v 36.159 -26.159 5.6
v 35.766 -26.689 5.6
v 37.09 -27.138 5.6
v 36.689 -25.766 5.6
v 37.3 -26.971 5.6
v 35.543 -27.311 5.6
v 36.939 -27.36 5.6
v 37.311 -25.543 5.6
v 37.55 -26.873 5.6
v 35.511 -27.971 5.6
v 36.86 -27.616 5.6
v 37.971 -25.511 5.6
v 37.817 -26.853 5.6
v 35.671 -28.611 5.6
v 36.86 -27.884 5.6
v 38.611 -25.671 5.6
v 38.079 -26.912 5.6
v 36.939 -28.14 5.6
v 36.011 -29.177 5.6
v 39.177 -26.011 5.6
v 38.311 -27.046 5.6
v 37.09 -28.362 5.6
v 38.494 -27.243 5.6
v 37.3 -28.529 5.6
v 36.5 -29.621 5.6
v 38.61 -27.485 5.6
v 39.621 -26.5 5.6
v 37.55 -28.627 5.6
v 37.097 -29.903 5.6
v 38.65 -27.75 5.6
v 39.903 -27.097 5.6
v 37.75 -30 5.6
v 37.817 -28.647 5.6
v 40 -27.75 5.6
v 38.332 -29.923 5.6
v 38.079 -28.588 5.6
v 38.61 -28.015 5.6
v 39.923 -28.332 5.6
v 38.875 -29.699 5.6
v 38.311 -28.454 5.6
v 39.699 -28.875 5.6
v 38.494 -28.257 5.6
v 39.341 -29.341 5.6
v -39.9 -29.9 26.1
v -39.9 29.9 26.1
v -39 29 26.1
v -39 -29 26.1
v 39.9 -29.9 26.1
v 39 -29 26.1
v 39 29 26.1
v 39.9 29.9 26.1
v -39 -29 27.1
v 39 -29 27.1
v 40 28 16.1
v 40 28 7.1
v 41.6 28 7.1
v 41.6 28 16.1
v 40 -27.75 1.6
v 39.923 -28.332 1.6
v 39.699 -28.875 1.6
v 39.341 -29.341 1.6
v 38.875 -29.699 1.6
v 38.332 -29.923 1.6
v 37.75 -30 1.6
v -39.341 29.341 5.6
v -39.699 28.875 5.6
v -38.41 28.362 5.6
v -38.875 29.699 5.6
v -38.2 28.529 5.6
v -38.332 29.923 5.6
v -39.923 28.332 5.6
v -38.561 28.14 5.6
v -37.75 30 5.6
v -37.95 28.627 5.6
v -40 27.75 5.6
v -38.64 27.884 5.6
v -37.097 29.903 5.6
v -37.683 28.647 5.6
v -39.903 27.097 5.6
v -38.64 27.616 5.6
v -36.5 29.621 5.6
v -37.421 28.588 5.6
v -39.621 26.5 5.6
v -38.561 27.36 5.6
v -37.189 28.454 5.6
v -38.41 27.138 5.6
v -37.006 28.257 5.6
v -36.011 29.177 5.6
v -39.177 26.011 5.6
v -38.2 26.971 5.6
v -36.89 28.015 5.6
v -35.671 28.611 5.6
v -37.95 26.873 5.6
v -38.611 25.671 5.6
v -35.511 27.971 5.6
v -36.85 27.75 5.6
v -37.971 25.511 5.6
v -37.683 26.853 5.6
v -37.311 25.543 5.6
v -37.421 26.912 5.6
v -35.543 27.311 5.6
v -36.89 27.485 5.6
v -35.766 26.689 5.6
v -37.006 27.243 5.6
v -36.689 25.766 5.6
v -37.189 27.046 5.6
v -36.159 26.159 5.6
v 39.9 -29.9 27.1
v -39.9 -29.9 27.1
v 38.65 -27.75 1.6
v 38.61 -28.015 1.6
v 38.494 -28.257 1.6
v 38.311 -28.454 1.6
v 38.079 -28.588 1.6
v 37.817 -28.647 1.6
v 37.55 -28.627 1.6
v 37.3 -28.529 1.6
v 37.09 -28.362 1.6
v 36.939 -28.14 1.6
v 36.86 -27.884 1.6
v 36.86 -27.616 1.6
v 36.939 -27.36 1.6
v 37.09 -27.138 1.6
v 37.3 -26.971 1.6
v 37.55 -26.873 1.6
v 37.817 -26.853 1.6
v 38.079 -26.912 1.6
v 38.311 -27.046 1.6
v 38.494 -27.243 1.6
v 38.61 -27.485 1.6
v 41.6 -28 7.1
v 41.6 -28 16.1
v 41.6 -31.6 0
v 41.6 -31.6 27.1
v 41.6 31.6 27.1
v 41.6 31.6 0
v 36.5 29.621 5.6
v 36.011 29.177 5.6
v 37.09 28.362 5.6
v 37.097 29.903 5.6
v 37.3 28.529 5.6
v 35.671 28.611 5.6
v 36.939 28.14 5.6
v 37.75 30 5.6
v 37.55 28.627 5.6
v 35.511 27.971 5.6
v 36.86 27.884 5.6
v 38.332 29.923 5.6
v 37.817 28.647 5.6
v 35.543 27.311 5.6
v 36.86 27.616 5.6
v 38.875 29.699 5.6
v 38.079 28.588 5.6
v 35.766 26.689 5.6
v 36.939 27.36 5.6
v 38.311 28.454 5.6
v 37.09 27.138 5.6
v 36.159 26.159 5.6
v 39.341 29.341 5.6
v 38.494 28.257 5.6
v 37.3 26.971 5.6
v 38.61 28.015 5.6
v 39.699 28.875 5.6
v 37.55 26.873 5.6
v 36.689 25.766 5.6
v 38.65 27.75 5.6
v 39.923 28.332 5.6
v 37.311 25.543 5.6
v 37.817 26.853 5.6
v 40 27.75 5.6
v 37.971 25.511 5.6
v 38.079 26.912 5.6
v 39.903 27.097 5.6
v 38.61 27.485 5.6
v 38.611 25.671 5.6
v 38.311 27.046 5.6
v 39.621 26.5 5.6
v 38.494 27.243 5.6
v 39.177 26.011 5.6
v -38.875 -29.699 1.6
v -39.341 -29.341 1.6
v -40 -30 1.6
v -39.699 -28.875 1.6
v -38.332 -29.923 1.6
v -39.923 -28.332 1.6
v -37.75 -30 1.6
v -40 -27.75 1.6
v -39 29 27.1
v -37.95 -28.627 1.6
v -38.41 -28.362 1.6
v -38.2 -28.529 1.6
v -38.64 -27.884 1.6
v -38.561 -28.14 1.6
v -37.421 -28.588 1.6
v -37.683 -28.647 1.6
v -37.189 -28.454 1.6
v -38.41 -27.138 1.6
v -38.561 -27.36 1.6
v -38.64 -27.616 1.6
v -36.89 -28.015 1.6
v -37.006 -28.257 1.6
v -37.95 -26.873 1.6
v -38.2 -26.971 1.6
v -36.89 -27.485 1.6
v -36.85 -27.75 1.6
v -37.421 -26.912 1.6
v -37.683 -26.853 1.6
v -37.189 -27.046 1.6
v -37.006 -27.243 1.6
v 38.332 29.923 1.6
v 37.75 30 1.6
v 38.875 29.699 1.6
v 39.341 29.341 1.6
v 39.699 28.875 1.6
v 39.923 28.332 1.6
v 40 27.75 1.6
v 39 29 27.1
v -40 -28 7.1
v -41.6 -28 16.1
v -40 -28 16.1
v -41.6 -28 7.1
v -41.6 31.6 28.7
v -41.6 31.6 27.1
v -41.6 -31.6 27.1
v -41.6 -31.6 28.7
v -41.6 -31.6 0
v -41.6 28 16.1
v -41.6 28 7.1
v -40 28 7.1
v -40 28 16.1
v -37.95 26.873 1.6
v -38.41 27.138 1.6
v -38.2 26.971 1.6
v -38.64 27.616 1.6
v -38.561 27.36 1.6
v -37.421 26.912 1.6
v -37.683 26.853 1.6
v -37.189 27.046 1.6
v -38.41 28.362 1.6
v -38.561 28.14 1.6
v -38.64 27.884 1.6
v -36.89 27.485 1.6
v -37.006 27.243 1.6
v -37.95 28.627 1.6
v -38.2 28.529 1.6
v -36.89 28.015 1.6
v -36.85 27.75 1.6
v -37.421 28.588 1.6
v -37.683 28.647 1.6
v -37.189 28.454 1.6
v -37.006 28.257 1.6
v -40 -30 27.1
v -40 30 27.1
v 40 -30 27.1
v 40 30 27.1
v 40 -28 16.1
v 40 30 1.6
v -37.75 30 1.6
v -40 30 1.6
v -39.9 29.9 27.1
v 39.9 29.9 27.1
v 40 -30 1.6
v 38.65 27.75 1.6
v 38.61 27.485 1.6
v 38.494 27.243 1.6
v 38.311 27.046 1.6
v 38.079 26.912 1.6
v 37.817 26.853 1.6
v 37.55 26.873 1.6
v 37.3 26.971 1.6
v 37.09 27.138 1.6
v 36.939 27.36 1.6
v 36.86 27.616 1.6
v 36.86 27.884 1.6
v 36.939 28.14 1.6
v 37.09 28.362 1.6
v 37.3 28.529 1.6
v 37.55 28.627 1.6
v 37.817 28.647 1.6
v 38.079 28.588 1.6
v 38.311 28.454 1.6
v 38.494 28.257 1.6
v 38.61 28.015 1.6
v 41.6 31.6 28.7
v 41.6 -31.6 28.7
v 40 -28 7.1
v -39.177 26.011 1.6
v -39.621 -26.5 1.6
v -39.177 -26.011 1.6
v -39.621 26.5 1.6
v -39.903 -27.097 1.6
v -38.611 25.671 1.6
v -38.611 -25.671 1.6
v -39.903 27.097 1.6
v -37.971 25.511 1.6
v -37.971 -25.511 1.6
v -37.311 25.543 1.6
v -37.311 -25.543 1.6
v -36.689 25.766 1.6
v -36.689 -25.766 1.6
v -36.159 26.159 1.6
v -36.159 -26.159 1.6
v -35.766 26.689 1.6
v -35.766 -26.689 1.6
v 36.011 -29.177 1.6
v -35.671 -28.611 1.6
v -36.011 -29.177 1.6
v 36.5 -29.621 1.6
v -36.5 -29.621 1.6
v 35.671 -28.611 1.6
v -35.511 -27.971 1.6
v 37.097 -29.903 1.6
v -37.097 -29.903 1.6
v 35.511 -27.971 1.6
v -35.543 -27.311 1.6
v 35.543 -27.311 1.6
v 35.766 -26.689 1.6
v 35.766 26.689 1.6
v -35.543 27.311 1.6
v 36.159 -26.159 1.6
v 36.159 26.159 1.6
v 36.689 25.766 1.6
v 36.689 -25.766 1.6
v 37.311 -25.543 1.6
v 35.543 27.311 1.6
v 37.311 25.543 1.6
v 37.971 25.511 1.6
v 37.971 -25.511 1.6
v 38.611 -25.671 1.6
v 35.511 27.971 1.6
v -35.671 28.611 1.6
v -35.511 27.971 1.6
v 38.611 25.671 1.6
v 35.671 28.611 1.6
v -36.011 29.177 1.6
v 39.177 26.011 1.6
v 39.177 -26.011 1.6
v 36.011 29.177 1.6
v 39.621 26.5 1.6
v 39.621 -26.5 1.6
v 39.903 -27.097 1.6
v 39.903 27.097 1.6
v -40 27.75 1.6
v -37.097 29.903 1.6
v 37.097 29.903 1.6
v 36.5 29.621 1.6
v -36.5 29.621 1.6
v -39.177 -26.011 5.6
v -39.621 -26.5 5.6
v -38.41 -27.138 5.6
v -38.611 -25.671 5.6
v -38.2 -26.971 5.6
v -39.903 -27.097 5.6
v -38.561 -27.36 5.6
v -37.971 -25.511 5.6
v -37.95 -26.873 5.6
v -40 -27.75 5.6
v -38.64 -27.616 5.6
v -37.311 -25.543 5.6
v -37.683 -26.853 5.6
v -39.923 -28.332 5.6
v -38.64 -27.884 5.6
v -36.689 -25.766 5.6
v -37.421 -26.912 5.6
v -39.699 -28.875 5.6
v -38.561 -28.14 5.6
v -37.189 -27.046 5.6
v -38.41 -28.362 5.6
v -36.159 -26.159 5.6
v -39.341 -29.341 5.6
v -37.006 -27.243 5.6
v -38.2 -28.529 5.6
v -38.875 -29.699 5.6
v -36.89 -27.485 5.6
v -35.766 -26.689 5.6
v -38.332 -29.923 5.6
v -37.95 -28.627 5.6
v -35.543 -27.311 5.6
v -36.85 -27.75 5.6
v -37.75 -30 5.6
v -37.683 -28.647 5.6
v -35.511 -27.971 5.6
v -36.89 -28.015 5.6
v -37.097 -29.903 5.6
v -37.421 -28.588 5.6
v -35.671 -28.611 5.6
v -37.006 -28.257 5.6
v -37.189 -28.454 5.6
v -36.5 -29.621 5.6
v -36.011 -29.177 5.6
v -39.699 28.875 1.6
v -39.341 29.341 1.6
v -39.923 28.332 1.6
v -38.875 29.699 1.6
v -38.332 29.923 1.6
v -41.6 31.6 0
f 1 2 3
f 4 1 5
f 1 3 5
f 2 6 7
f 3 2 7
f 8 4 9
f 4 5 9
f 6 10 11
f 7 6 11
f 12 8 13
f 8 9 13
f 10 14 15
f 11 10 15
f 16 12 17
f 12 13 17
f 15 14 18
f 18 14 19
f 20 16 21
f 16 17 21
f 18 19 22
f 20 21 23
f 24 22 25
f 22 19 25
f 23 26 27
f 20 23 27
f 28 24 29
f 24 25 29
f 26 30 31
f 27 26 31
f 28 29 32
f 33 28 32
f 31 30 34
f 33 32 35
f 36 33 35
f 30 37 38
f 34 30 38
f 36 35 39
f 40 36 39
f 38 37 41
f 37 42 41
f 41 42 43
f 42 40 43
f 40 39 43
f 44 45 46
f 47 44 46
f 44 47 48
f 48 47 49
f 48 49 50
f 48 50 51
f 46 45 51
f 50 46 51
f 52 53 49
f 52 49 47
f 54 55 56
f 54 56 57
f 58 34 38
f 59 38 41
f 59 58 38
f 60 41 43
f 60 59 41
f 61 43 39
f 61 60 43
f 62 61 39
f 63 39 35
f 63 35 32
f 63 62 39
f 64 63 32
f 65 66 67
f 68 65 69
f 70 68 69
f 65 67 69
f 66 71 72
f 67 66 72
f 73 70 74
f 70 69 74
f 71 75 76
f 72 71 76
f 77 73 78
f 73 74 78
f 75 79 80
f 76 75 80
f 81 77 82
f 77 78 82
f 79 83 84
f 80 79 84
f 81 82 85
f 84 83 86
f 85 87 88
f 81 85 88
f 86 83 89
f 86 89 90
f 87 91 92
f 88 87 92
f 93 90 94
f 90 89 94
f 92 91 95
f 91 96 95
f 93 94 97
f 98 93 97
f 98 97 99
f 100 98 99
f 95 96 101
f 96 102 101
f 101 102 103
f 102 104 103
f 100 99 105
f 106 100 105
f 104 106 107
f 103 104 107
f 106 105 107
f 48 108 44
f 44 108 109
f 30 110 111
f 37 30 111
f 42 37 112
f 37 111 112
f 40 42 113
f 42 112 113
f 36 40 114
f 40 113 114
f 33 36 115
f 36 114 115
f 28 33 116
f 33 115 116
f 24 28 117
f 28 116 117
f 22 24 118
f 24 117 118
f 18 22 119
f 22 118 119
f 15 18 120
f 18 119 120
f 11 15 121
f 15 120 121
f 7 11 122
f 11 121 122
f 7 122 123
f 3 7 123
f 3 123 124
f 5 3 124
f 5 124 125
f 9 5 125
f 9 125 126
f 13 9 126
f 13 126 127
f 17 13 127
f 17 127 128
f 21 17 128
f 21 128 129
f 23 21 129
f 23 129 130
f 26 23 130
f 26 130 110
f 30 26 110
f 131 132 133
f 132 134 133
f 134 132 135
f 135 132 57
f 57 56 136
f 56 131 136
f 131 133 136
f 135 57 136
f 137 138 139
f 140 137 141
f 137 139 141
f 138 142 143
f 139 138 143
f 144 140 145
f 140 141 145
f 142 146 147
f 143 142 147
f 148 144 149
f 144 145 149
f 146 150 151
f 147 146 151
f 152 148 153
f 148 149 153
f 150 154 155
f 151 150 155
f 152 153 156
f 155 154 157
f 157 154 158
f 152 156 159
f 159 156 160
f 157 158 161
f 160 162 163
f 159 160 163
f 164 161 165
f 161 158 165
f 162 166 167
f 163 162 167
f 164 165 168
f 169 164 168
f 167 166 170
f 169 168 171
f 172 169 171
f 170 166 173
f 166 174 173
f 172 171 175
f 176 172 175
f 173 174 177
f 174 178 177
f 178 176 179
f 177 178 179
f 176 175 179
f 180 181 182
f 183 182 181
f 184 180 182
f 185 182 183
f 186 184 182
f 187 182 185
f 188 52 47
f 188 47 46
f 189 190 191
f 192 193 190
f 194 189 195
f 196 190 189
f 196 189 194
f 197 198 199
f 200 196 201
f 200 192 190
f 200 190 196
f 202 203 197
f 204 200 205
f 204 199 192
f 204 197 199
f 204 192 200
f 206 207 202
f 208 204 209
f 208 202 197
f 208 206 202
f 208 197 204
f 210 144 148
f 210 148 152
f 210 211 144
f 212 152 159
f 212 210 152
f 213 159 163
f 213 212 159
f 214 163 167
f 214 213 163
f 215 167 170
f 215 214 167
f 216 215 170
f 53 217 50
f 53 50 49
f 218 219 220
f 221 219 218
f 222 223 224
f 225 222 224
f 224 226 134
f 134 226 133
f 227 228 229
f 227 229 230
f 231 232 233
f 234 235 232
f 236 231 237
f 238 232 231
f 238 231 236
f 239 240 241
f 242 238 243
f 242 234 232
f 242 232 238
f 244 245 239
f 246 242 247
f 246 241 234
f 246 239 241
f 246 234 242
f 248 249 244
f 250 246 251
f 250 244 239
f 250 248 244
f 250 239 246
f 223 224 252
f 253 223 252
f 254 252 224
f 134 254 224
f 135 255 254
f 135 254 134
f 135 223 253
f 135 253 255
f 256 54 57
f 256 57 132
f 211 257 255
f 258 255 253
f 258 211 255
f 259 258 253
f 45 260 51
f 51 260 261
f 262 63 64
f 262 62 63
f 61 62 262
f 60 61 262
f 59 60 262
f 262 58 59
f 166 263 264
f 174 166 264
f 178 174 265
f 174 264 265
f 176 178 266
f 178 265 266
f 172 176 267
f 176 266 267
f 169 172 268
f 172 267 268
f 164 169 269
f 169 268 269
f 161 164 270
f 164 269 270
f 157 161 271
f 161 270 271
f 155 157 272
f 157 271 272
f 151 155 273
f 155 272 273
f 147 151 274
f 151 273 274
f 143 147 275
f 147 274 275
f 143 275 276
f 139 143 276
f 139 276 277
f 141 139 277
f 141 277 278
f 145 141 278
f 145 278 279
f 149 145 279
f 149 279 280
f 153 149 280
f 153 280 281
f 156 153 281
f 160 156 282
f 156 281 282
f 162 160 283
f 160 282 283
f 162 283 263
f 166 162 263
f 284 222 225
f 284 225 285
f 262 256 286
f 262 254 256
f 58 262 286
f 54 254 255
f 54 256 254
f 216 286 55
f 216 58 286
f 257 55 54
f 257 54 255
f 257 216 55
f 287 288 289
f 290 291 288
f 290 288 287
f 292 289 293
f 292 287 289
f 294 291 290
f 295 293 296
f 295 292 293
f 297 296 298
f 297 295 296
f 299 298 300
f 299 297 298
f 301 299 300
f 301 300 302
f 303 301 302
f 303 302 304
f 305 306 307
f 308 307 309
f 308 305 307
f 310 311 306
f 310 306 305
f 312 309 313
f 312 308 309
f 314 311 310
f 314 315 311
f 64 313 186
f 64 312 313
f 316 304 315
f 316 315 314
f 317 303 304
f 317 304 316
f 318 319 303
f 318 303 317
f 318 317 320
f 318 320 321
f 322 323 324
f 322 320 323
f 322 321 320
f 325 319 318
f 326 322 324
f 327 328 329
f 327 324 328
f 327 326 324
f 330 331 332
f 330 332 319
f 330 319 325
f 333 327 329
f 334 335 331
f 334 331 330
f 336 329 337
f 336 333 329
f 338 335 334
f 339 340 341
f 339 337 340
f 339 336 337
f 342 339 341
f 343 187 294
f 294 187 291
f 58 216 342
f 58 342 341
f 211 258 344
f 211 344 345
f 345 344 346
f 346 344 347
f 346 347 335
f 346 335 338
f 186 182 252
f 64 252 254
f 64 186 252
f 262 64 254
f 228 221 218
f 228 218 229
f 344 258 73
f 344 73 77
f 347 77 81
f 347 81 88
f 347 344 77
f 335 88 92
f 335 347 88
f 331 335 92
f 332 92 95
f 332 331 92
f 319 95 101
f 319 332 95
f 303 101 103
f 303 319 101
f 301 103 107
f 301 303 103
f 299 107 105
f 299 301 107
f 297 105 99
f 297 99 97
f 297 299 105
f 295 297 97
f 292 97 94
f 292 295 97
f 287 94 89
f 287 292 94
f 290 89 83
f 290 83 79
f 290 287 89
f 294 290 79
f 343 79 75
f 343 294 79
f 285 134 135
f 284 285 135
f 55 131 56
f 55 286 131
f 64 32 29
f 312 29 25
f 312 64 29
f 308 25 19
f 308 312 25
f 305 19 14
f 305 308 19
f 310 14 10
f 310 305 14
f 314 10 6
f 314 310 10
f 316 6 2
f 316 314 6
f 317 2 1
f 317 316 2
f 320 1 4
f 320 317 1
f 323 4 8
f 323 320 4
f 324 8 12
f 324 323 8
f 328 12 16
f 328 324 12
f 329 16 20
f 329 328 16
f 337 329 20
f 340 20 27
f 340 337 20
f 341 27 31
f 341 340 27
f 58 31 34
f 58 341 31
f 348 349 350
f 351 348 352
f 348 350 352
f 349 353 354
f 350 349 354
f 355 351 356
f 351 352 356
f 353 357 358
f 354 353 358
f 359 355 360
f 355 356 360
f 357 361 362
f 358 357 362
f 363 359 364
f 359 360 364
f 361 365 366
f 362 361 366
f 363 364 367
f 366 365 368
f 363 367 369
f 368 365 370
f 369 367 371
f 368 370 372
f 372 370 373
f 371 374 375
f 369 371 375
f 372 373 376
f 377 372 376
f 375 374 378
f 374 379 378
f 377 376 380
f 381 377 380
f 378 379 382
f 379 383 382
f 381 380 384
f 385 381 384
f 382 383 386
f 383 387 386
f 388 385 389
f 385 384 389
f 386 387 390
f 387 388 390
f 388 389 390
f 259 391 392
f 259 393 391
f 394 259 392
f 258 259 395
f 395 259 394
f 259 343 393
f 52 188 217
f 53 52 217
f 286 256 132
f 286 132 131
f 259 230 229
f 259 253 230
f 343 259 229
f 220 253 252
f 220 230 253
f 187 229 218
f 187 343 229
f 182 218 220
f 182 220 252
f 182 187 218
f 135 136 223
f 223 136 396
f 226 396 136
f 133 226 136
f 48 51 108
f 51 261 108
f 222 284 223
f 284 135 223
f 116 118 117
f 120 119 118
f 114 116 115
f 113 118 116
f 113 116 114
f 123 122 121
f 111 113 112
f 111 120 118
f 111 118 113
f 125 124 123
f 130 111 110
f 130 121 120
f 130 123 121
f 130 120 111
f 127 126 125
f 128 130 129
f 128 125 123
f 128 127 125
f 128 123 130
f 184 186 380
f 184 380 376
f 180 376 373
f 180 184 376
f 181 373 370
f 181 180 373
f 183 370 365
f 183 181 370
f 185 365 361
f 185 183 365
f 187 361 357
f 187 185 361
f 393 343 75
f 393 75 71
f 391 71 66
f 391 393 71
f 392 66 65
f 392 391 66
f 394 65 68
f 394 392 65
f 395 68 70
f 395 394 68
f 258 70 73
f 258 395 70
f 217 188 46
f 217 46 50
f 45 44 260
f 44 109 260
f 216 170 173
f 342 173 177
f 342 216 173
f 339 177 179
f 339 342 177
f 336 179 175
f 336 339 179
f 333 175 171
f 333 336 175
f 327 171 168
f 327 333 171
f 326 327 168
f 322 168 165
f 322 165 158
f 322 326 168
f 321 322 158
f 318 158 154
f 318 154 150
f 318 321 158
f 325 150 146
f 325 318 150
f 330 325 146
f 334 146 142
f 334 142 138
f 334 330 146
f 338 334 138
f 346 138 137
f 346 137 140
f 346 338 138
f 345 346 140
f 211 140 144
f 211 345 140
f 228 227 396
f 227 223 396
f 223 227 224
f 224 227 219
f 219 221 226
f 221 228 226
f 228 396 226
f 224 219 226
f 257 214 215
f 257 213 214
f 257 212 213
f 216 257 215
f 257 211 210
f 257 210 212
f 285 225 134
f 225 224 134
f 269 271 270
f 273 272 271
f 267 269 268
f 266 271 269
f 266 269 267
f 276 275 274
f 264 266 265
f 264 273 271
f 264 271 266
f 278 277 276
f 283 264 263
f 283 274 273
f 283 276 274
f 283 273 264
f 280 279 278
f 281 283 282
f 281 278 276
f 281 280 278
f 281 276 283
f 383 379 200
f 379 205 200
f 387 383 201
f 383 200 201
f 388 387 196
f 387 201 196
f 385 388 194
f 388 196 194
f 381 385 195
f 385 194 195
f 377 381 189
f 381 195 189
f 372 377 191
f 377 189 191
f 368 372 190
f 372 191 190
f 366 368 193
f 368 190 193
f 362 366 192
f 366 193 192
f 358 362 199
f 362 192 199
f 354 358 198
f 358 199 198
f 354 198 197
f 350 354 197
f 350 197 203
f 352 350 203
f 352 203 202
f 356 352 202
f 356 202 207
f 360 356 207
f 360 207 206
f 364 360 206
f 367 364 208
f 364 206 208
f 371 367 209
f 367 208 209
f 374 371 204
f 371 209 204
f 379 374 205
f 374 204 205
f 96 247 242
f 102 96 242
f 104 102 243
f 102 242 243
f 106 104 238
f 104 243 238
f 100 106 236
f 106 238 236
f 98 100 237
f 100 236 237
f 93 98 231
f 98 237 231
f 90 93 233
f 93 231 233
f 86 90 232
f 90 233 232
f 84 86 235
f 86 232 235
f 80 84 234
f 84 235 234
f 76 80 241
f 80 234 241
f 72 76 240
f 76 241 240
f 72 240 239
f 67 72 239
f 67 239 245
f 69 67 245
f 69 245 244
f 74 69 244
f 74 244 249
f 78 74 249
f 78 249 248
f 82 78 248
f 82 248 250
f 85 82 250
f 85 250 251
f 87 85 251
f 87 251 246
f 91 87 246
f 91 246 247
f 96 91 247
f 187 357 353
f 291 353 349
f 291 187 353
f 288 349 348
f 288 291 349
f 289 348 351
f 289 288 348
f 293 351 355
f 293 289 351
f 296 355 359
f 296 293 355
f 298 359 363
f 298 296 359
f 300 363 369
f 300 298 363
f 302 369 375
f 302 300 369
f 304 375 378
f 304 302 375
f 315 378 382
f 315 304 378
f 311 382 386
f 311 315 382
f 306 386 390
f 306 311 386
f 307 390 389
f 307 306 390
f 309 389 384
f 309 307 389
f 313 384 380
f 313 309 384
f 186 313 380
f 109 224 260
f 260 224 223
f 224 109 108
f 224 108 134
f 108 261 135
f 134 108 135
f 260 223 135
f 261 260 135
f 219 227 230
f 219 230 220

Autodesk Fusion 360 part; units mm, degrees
sketch "Base" plane through (0, 0, 0) normal (0, 0, 1) x (1, 0, 0)
  line L0 (41.6, 31.6) -> (-41.6, 31.6)
  line L1 (-41.6, 31.6) -> (-41.6, -31.6)
  line L2 (-41.6, -31.6) -> (41.6, -31.6)
  line L3 (41.6, -31.6) -> (41.6, 31.6)
  line L4 (41.6, 31.6) -> (-41.6, -31.6) construction
  line L5 (-41.6, 31.6) -> (41.6, -31.6) construction
  point P0 (-41.6, 0)
  dimension "d1" = 83.2
  dimension "d2" = 63.2
extrude "Extrusion1" add sketch "Base" along normal blind 28.7 makes body 1
shell "Schale1" thickness 1.6 removed faces 0 bodies 1
ref_plane "Arbeitsebene1" through (-40, -30, 1.6) normal (0, 0, -1) x (-1, 0, 0)
sketch "Skizze3" plane through (-27.6, -16.7, 1.6) normal (0, 0, -1) x (1, 0, 0)
  line L0 (-12.4, 13.3) -> (67.6, 13.3)
  line L1 (-12.4, -46.7) -> (-12.4, 13.3)
  circle A0 centre (-10.15, 11.05) radius 2.25
  line L2 (67.6, -46.7) -> (-12.4, -46.7)
  circle A1 centre (-10.15, -44.45) radius 2.25
  line L3 (67.6, 13.3) -> (67.6, -46.7)
  circle A2 centre (65.35, -44.45) radius 2.25
  circle A3 centre (65.35, 11.05) radius 2.25
  circle A4 centre (-10.15, 11.05) radius 0.9
  circle A5 centre (-10.15, -44.45) radius 0.9
  circle A6 centre (65.35, -44.45) radius 0.9
  circle A7 centre (65.35, 11.05) radius 0.9
  dimension "d7" = 2.25
  dimension "d8" = 2.25
  dimension "d9" = 2.25
  dimension "d10" = 2.25
  dimension "d19" = 1.8
  dimension "d20" = 1.8
  dimension "d21" = 1.8
  dimension "d22" = 1.8
extrude "Extrusion2" add sketch "Skizze3" against normal blind 4 contours A0 | A3 | A1 | A2 bodies 1
ref_plane "Arbeitsebene2" through (0, 0, 27.1) normal (0, 0, 1) x (1, 0, 0)
split "Teilen1" by plane through (0, 0, 27.1) normal (0, 0, 1) bodies 1 makes body 2 at (-13.8667, 10.5333, 28.7)
sketch "Skizze6" plane through (0, 0, 27.1) normal (0, 0, 1) x (1, 0, 0)
  line L0 (40, -30) -> (-40, -30)
  line L1 (-40, -30) -> (-40, 30)
  line L2 (-40, 30) -> (40, 30)
  line L3 (40, 30) -> (40, -30)
  line L4 (-41.6, -31.6) -> (41.6, -31.6)
  line L5 (41.6, -31.6) -> (41.6, 31.6)
  line L6 (41.6, 31.6) -> (-41.6, 31.6)
  line L7 (-41.6, 31.6) -> (-41.6, -31.6)
sketch "Skizze7" plane through (0, 0, 27.1) normal (0, 0, 1) x (1, 0, 0)
  line L0 (40, -30) -> (-40, -30)
  line L1 (-40, -30) -> (-40, 30)
  line L2 (-40, 30) -> (40, 30)
  line L3 (40, 30) -> (40, -30)
  line L4 (-41.6, -31.6) -> (41.6, -31.6)
  line L5 (41.6, -31.6) -> (41.6, 31.6)
  line L6 (41.6, 31.6) -> (-41.6, 31.6)
  line L7 (-41.6, 31.6) -> (-41.6, -31.6)
  line L8 (-39.9, 29.9) -> (39.9, 29.9)
  line L9 (39.9, 29.9) -> (39.9, -29.9)
  line L10 (39.9, -29.9) -> (-39.9, -29.9)
  line L11 (-39.9, -29.9) -> (-39.9, 29.9)
  line L12 (-39, 29) -> (39, 29)
  line L13 (39, 29) -> (39, -29)
  line L14 (39, -29) -> (-39, -29)
  line L15 (-39, -29) -> (-39, 29)
  point P0 (-40, -30)
  dimension "d34" = 0.1
  dimension "d35" = 1
extrude "Extrusion5" add sketch "Skizze7" against normal blind 1 contours L8 L9 L10 L11 bodies 2
sketch "Hole" plane through (-41.6, 0, 0) normal (-1, 0, 0) x (0, -1, 0)
  line L0 (-31.6, 0) -> (31.6, 0)
  line L1 (31.6, 0) -> (31.6, 27.1)
  line L2 (31.6, 28.7) -> (-31.6, 28.7)
  line L3 (-31.6, 27.1) -> (-31.6, 0)
  line L4 (-28, 16.1) -> (28, 16.1)
  line L5 (28, 16.1) -> (28, 7.1)
  line L6 (28, 7.1) -> (-28, 7.1)
  line L7 (-28, 7.1) -> (-28, 16.1)
  line L8 (27.75, 1.6) -> (30, 1.6)
  line L9 (-27.75, 1.6) -> (27.75, 1.6)
  line L10 (-30, 1.6) -> (-27.75, 1.6)
  line L11 (31.6, 27.1) -> (-31.6, 27.1)
  line L12 (-31.6, 27.1) -> (31.6, 27.1)
  line L13 (31.6, 27.1) -> (31.6, 28.7)
  line L14 (-31.6, 28.7) -> (-31.6, 27.1)
  point P0 (0, 7.1)
  dimension "d13" = 56
  dimension "d14" = 9
  dimension "d40" = 7.1
extrude "Extrusion3" cut sketch "Hole" against normal blind 83.2 contours L4 L5 L6 L7 bodies 1
equation "d1 = pcb_length + 2 * wall_thickness"
equation "d2 = pcb_width + 2 * wall_thickness"
equation "d3 = case_internal_height + 2 * wall_thickness"
equation "d5 = wall_thickness"
equation "wall_thickness = 1.6 mm"
equation "d7 = socket_width / 2"
equation "d8 = socket_width / 2"
equation "d9 = socket_width / 2"
equation "d10 = socket_width / 2"
equation "d11 = -pcb_space_below"
equation "d13 = pcb_width - ( 2 * 2 ) * 1 mm"
equation "d14 = hole_height"
equation "d17 = -2 * wall_thickness - pcb_length"
equation "d19 = socket_hole_with"
equation "d20 = socket_hole_with"
equation "d21 = socket_hole_with"
equation "d22 = socket_hole_with"
equation "d23 = -wall_thickness"
equation "pcb_width = 60 mm"
equation "pcb_length = 80 mm"
equation "case_internal_height = pcb_space_above + pcb_space_below + pcb_thickness" comment "max. 33mm in front, 40mm in back side"
equation "pcb_space_below = 4 mm"
equation "pcb_thickness = 1.5 mm"
equation "pcb_space_above = 20 mm"
equation "socket_hole_with = 1.8 mm"
equation "socket_width = 4.5 mm" comment "measured from walls"
equation "d40 = wall_thickness + pcb_space_below + pcb_thickness"
equation "hole_height = 9 mm" comment "for usb and cables"
